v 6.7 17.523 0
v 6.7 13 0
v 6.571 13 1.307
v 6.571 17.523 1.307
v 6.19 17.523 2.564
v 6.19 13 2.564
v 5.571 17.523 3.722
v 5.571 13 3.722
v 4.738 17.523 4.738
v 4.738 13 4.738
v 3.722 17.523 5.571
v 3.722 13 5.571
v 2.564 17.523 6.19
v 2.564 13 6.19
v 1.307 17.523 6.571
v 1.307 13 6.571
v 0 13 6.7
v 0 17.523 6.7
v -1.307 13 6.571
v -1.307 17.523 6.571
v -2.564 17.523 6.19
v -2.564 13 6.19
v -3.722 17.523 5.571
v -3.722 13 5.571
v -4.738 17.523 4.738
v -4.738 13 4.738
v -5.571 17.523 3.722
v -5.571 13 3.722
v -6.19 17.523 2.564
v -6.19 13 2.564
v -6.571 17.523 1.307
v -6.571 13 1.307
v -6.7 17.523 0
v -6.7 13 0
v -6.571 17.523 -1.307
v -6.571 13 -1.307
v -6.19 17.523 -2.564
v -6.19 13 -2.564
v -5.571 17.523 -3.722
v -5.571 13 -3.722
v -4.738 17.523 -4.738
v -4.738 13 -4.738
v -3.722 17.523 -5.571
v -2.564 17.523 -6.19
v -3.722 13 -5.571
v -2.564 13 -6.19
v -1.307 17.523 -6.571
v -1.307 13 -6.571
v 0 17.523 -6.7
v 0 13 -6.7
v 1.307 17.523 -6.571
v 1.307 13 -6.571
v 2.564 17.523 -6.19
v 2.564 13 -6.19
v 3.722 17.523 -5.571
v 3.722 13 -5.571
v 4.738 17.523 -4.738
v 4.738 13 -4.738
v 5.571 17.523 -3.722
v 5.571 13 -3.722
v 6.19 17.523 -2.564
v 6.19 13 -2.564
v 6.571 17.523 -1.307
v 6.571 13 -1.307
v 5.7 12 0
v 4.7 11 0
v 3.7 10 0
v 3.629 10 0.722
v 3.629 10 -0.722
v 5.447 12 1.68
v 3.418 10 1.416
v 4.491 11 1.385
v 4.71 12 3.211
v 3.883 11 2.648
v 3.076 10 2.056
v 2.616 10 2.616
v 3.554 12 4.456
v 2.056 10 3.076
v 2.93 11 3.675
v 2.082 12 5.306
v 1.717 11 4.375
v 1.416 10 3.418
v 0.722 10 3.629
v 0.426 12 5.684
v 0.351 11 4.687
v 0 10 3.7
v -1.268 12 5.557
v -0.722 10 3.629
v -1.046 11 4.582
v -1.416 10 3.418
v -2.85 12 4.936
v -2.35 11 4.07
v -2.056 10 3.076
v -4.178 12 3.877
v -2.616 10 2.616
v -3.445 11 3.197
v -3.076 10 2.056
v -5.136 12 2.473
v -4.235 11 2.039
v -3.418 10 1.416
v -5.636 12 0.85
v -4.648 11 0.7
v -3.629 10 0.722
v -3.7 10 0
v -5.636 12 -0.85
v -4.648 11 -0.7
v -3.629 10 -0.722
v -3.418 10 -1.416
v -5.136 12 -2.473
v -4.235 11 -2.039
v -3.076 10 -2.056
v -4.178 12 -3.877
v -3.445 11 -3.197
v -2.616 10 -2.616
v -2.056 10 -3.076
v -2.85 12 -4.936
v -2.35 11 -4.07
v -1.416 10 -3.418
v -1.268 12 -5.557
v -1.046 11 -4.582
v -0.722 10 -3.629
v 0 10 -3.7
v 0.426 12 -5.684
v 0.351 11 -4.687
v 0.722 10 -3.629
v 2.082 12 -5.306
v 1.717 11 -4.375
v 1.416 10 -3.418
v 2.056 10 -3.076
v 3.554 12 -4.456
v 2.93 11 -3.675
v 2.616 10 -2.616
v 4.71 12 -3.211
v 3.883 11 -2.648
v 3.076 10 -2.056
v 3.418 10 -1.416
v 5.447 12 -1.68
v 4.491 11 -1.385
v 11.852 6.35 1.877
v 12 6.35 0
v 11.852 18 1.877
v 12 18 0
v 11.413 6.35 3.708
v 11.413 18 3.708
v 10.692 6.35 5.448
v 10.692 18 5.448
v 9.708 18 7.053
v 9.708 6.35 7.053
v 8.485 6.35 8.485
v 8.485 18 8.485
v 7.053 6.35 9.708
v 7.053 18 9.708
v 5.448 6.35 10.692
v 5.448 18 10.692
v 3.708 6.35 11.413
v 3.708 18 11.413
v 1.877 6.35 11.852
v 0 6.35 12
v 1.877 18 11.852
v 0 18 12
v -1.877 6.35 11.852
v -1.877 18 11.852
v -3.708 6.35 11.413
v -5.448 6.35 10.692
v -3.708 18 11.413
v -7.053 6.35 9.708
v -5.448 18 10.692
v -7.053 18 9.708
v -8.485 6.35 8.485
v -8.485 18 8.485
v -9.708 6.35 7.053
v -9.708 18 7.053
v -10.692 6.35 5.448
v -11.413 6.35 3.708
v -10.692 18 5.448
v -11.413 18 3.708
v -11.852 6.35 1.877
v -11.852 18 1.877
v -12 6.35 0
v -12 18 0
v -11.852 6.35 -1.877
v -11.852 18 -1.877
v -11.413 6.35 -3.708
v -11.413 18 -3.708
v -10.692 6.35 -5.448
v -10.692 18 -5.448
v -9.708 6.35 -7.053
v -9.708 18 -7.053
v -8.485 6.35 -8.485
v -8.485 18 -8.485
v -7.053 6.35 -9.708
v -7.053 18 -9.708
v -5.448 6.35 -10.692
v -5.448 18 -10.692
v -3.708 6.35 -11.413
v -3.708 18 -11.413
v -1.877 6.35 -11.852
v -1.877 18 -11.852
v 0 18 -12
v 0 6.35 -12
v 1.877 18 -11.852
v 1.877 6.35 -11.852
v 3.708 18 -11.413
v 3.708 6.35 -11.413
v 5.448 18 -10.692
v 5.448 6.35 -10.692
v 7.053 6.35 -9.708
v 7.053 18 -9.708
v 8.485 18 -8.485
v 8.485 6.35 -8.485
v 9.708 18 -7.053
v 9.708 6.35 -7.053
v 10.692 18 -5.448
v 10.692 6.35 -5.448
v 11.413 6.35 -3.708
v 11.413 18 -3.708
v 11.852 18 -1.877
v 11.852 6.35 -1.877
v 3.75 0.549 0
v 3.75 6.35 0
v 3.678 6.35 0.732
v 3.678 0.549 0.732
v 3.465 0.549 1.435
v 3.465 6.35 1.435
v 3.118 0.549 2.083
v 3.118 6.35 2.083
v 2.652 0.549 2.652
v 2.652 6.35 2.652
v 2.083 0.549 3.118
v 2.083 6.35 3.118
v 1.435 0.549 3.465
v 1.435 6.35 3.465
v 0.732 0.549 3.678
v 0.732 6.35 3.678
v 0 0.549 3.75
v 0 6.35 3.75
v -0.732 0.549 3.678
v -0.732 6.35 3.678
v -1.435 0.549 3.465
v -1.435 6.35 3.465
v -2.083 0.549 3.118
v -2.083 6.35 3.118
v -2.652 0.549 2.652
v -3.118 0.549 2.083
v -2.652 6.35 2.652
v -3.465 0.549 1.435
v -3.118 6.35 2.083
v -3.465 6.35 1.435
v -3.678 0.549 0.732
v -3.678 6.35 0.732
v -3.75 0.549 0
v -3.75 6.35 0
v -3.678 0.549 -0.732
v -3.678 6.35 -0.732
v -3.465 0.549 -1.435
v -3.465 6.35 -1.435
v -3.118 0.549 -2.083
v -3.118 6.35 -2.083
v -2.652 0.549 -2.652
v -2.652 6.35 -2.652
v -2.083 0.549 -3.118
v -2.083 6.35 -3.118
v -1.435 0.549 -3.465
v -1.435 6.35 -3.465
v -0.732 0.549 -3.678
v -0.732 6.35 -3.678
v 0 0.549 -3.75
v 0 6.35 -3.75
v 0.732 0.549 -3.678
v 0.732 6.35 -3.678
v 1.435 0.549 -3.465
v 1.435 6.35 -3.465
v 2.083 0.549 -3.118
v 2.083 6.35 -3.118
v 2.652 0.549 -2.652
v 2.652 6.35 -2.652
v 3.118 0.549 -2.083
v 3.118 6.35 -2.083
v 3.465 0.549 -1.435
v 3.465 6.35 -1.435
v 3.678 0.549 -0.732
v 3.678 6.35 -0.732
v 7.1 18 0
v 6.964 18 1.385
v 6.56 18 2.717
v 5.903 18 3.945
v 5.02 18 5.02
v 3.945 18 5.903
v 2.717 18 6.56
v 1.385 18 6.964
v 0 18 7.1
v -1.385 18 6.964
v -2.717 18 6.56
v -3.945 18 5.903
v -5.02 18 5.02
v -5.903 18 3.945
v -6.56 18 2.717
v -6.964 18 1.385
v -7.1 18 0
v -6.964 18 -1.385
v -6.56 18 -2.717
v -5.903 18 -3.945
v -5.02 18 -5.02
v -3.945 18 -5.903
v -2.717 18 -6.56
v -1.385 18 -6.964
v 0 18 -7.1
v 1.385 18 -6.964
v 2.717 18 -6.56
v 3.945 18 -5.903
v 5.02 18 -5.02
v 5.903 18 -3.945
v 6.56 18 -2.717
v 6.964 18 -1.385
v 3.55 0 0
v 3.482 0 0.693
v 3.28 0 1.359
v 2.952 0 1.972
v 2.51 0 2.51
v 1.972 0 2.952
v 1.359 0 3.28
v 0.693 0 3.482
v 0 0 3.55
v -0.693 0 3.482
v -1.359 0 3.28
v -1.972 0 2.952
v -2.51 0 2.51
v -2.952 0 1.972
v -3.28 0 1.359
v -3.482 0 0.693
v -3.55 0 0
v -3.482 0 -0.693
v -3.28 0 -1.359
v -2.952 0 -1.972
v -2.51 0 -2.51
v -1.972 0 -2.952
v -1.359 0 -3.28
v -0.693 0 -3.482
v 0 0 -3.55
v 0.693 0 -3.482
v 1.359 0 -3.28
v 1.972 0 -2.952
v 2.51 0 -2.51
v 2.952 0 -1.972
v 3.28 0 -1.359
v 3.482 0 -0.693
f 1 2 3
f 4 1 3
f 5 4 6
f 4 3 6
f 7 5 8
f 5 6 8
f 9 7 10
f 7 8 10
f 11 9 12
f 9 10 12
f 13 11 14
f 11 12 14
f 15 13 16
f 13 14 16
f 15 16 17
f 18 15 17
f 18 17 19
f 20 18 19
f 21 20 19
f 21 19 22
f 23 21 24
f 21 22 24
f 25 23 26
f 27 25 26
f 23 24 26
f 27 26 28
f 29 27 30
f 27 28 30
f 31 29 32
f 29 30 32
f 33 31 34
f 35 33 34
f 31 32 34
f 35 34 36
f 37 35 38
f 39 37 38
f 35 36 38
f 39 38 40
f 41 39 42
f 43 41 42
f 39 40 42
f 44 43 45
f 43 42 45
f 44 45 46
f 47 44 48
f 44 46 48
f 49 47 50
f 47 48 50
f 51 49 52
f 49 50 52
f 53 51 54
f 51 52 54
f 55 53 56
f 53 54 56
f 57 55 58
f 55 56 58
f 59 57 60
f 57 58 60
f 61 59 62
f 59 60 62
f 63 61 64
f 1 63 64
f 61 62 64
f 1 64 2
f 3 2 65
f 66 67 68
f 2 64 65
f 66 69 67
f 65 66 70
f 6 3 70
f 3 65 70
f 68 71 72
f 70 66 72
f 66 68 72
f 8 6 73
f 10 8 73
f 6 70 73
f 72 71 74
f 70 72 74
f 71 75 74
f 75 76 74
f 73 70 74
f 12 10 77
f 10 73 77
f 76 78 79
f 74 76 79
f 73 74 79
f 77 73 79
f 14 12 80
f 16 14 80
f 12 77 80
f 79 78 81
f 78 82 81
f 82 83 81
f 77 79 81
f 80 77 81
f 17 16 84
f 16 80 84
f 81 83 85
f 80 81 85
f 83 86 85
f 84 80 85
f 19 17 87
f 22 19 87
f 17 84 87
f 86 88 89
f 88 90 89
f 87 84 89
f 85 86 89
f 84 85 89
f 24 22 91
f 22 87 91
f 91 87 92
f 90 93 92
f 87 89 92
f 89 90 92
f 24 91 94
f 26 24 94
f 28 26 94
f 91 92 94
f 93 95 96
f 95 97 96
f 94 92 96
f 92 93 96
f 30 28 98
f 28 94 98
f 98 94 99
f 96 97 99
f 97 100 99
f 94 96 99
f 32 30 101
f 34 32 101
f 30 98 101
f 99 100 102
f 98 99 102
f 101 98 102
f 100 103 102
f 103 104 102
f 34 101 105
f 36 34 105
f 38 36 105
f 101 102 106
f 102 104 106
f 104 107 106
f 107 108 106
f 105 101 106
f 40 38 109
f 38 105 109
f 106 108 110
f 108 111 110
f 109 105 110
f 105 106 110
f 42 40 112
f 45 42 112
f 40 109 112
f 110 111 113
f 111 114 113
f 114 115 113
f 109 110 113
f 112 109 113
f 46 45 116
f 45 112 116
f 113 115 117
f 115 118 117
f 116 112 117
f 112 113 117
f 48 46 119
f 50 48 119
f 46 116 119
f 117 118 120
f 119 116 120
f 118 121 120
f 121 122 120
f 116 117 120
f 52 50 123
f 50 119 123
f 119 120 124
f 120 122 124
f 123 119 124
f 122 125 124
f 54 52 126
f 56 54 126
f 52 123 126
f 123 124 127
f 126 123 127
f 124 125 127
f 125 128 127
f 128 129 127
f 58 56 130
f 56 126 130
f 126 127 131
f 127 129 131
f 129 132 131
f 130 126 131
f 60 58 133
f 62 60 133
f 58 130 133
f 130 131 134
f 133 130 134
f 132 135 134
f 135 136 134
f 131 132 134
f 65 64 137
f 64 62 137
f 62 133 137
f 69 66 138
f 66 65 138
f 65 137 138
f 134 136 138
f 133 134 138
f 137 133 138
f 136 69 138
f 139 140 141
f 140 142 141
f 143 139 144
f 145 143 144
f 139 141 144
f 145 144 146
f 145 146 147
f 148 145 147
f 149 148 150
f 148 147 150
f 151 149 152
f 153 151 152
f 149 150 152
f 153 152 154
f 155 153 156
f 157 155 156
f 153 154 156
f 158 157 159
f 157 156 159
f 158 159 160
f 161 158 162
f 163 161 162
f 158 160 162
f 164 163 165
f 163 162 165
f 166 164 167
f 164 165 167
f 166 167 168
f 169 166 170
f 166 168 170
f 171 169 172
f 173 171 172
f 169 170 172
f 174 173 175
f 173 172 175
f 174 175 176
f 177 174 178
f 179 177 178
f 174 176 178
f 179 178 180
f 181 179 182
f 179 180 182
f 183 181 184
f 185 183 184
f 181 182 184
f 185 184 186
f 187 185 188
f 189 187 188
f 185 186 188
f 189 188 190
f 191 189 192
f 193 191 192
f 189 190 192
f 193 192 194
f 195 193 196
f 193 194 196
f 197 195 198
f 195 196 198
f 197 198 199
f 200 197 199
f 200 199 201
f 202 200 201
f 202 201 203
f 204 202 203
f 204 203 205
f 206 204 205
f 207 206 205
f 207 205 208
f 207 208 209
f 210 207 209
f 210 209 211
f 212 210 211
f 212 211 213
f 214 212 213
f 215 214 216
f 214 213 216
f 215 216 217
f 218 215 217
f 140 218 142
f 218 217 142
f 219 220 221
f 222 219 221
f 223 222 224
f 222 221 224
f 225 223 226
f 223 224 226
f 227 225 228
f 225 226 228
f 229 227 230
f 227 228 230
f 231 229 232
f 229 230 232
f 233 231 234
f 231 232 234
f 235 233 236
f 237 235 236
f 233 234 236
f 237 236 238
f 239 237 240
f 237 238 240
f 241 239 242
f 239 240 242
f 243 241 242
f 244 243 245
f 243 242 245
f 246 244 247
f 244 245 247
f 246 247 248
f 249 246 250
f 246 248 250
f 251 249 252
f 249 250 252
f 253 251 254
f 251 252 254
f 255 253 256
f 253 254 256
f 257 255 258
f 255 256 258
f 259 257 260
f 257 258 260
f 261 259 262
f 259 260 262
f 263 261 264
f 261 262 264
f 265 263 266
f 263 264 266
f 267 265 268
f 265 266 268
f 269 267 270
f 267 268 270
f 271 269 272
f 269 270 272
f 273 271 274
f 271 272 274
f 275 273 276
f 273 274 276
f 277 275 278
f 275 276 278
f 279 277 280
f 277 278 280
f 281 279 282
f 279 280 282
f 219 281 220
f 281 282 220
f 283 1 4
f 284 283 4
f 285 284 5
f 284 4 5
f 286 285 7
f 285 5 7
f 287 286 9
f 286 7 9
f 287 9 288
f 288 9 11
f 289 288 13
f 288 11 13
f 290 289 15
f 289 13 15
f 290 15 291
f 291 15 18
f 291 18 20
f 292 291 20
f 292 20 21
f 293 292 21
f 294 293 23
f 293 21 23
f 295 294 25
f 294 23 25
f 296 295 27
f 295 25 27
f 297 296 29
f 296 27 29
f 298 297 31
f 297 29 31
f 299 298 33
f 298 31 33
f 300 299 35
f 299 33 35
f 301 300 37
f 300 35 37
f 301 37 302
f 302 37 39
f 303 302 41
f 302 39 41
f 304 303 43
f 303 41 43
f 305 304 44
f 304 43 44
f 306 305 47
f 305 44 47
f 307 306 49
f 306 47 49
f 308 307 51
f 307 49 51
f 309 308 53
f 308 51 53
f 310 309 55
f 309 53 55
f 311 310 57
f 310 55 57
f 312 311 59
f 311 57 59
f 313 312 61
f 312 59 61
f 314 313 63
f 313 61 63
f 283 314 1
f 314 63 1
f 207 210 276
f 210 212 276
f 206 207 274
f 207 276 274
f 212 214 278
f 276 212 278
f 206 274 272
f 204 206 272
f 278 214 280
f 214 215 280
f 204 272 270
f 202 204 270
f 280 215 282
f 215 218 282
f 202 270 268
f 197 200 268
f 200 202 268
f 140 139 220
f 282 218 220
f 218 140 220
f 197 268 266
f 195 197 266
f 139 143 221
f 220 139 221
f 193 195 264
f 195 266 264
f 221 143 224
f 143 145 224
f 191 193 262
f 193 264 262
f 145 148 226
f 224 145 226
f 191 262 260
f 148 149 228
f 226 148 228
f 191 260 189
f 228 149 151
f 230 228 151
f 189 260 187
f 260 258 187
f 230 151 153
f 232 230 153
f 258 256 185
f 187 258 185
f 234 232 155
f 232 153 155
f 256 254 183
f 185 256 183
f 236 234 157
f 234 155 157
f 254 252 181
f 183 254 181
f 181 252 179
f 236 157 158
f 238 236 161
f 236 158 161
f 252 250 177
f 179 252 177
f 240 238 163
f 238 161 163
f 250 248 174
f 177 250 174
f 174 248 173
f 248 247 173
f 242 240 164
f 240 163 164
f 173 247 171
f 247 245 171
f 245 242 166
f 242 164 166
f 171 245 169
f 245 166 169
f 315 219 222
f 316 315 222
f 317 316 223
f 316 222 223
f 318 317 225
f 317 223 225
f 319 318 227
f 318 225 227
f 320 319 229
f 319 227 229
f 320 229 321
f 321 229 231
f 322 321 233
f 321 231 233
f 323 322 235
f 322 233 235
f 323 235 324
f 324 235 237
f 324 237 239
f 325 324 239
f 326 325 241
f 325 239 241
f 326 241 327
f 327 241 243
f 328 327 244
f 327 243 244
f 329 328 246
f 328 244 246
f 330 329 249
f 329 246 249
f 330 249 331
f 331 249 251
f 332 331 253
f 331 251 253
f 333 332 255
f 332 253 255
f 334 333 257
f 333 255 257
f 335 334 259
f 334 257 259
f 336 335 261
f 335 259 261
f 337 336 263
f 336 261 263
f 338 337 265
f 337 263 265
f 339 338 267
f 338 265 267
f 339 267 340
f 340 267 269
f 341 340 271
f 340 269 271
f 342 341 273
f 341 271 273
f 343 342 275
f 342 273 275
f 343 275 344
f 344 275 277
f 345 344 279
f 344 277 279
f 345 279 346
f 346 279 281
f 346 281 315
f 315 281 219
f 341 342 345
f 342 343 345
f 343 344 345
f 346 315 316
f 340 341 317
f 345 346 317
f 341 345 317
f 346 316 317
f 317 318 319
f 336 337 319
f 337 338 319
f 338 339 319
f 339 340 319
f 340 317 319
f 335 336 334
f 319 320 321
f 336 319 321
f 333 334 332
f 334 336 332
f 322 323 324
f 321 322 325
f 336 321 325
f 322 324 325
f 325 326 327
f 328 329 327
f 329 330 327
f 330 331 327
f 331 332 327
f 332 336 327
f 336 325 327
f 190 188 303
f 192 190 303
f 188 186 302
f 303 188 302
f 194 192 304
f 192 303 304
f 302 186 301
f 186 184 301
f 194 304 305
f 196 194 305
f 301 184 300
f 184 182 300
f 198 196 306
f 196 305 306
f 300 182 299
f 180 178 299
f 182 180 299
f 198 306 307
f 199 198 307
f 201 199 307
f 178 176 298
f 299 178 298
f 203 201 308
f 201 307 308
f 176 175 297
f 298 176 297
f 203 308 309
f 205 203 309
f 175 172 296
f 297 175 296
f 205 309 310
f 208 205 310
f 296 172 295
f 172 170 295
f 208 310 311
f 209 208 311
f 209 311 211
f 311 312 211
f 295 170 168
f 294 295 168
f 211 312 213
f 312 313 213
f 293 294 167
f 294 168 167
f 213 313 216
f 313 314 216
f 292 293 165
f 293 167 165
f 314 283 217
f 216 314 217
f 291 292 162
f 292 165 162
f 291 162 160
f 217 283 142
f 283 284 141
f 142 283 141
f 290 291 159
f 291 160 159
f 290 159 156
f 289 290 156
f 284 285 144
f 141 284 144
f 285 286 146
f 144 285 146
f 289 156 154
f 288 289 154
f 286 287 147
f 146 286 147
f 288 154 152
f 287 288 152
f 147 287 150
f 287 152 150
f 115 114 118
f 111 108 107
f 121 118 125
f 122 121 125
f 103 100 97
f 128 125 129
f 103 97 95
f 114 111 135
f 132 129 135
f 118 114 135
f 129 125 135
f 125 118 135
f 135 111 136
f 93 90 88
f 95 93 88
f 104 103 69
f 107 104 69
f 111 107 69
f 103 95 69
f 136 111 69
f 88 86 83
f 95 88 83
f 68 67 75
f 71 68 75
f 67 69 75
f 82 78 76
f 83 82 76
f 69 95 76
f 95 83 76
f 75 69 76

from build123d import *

# Parameters (mm, degrees)
CHAMFER1_SIZE  = 3
CHAMFER2_SIZE  = 0.2
CHAMFER2_SIZE2 = 0.549495484
CHAMFER3_SIZE  = 0.4
CHAMFER3_SIZE2 = 0.476701437


with BuildPart() as part:
    # Sketch1 → Revolve1 (revolve)
    with BuildSketch(Plane.XY):
        Polygon((0, 0), (3.75, 0), (3.75, 6.35), (12, 6.35), (12, 18), (6.7, 18), (6.7, 10), (0, 10), align=None)
    revolve(axis=Axis((0, 10, 0), (0, -1, 0)))

    # Chamfer1
    chamfer1_edges = [part.edges().sort_by_distance(p)[0] for p in [
        (-6.7, 10, 0),
    ]]
    chamfer(chamfer1_edges, length=CHAMFER1_SIZE)

    # Chamfer2
    chamfer2_edges = [part.edges().sort_by_distance(p)[0] for p in [
        (-3.75, 0, 0),
    ]]
    chamfer2_side = [part.faces().sort_by_distance(p)[0] for p in [
        (0, 0, 0),
    ]]
    chamfer(chamfer2_edges, length=CHAMFER2_SIZE, length2=CHAMFER2_SIZE2, reference=chamfer2_side[0])

    # Chamfer3
    chamfer3_edges = [part.edges().sort_by_distance(p)[0] for p in [
        (-6.7, 18, 0),
    ]]
    chamfer3_side = [part.faces().sort_by_distance(p)[0] for p in [
        (-11.660588745, 18, 0),
    ]]
    chamfer(chamfer3_edges, length=CHAMFER3_SIZE, length2=CHAMFER3_SIZE2, reference=chamfer3_side[0])


solid = part.part
